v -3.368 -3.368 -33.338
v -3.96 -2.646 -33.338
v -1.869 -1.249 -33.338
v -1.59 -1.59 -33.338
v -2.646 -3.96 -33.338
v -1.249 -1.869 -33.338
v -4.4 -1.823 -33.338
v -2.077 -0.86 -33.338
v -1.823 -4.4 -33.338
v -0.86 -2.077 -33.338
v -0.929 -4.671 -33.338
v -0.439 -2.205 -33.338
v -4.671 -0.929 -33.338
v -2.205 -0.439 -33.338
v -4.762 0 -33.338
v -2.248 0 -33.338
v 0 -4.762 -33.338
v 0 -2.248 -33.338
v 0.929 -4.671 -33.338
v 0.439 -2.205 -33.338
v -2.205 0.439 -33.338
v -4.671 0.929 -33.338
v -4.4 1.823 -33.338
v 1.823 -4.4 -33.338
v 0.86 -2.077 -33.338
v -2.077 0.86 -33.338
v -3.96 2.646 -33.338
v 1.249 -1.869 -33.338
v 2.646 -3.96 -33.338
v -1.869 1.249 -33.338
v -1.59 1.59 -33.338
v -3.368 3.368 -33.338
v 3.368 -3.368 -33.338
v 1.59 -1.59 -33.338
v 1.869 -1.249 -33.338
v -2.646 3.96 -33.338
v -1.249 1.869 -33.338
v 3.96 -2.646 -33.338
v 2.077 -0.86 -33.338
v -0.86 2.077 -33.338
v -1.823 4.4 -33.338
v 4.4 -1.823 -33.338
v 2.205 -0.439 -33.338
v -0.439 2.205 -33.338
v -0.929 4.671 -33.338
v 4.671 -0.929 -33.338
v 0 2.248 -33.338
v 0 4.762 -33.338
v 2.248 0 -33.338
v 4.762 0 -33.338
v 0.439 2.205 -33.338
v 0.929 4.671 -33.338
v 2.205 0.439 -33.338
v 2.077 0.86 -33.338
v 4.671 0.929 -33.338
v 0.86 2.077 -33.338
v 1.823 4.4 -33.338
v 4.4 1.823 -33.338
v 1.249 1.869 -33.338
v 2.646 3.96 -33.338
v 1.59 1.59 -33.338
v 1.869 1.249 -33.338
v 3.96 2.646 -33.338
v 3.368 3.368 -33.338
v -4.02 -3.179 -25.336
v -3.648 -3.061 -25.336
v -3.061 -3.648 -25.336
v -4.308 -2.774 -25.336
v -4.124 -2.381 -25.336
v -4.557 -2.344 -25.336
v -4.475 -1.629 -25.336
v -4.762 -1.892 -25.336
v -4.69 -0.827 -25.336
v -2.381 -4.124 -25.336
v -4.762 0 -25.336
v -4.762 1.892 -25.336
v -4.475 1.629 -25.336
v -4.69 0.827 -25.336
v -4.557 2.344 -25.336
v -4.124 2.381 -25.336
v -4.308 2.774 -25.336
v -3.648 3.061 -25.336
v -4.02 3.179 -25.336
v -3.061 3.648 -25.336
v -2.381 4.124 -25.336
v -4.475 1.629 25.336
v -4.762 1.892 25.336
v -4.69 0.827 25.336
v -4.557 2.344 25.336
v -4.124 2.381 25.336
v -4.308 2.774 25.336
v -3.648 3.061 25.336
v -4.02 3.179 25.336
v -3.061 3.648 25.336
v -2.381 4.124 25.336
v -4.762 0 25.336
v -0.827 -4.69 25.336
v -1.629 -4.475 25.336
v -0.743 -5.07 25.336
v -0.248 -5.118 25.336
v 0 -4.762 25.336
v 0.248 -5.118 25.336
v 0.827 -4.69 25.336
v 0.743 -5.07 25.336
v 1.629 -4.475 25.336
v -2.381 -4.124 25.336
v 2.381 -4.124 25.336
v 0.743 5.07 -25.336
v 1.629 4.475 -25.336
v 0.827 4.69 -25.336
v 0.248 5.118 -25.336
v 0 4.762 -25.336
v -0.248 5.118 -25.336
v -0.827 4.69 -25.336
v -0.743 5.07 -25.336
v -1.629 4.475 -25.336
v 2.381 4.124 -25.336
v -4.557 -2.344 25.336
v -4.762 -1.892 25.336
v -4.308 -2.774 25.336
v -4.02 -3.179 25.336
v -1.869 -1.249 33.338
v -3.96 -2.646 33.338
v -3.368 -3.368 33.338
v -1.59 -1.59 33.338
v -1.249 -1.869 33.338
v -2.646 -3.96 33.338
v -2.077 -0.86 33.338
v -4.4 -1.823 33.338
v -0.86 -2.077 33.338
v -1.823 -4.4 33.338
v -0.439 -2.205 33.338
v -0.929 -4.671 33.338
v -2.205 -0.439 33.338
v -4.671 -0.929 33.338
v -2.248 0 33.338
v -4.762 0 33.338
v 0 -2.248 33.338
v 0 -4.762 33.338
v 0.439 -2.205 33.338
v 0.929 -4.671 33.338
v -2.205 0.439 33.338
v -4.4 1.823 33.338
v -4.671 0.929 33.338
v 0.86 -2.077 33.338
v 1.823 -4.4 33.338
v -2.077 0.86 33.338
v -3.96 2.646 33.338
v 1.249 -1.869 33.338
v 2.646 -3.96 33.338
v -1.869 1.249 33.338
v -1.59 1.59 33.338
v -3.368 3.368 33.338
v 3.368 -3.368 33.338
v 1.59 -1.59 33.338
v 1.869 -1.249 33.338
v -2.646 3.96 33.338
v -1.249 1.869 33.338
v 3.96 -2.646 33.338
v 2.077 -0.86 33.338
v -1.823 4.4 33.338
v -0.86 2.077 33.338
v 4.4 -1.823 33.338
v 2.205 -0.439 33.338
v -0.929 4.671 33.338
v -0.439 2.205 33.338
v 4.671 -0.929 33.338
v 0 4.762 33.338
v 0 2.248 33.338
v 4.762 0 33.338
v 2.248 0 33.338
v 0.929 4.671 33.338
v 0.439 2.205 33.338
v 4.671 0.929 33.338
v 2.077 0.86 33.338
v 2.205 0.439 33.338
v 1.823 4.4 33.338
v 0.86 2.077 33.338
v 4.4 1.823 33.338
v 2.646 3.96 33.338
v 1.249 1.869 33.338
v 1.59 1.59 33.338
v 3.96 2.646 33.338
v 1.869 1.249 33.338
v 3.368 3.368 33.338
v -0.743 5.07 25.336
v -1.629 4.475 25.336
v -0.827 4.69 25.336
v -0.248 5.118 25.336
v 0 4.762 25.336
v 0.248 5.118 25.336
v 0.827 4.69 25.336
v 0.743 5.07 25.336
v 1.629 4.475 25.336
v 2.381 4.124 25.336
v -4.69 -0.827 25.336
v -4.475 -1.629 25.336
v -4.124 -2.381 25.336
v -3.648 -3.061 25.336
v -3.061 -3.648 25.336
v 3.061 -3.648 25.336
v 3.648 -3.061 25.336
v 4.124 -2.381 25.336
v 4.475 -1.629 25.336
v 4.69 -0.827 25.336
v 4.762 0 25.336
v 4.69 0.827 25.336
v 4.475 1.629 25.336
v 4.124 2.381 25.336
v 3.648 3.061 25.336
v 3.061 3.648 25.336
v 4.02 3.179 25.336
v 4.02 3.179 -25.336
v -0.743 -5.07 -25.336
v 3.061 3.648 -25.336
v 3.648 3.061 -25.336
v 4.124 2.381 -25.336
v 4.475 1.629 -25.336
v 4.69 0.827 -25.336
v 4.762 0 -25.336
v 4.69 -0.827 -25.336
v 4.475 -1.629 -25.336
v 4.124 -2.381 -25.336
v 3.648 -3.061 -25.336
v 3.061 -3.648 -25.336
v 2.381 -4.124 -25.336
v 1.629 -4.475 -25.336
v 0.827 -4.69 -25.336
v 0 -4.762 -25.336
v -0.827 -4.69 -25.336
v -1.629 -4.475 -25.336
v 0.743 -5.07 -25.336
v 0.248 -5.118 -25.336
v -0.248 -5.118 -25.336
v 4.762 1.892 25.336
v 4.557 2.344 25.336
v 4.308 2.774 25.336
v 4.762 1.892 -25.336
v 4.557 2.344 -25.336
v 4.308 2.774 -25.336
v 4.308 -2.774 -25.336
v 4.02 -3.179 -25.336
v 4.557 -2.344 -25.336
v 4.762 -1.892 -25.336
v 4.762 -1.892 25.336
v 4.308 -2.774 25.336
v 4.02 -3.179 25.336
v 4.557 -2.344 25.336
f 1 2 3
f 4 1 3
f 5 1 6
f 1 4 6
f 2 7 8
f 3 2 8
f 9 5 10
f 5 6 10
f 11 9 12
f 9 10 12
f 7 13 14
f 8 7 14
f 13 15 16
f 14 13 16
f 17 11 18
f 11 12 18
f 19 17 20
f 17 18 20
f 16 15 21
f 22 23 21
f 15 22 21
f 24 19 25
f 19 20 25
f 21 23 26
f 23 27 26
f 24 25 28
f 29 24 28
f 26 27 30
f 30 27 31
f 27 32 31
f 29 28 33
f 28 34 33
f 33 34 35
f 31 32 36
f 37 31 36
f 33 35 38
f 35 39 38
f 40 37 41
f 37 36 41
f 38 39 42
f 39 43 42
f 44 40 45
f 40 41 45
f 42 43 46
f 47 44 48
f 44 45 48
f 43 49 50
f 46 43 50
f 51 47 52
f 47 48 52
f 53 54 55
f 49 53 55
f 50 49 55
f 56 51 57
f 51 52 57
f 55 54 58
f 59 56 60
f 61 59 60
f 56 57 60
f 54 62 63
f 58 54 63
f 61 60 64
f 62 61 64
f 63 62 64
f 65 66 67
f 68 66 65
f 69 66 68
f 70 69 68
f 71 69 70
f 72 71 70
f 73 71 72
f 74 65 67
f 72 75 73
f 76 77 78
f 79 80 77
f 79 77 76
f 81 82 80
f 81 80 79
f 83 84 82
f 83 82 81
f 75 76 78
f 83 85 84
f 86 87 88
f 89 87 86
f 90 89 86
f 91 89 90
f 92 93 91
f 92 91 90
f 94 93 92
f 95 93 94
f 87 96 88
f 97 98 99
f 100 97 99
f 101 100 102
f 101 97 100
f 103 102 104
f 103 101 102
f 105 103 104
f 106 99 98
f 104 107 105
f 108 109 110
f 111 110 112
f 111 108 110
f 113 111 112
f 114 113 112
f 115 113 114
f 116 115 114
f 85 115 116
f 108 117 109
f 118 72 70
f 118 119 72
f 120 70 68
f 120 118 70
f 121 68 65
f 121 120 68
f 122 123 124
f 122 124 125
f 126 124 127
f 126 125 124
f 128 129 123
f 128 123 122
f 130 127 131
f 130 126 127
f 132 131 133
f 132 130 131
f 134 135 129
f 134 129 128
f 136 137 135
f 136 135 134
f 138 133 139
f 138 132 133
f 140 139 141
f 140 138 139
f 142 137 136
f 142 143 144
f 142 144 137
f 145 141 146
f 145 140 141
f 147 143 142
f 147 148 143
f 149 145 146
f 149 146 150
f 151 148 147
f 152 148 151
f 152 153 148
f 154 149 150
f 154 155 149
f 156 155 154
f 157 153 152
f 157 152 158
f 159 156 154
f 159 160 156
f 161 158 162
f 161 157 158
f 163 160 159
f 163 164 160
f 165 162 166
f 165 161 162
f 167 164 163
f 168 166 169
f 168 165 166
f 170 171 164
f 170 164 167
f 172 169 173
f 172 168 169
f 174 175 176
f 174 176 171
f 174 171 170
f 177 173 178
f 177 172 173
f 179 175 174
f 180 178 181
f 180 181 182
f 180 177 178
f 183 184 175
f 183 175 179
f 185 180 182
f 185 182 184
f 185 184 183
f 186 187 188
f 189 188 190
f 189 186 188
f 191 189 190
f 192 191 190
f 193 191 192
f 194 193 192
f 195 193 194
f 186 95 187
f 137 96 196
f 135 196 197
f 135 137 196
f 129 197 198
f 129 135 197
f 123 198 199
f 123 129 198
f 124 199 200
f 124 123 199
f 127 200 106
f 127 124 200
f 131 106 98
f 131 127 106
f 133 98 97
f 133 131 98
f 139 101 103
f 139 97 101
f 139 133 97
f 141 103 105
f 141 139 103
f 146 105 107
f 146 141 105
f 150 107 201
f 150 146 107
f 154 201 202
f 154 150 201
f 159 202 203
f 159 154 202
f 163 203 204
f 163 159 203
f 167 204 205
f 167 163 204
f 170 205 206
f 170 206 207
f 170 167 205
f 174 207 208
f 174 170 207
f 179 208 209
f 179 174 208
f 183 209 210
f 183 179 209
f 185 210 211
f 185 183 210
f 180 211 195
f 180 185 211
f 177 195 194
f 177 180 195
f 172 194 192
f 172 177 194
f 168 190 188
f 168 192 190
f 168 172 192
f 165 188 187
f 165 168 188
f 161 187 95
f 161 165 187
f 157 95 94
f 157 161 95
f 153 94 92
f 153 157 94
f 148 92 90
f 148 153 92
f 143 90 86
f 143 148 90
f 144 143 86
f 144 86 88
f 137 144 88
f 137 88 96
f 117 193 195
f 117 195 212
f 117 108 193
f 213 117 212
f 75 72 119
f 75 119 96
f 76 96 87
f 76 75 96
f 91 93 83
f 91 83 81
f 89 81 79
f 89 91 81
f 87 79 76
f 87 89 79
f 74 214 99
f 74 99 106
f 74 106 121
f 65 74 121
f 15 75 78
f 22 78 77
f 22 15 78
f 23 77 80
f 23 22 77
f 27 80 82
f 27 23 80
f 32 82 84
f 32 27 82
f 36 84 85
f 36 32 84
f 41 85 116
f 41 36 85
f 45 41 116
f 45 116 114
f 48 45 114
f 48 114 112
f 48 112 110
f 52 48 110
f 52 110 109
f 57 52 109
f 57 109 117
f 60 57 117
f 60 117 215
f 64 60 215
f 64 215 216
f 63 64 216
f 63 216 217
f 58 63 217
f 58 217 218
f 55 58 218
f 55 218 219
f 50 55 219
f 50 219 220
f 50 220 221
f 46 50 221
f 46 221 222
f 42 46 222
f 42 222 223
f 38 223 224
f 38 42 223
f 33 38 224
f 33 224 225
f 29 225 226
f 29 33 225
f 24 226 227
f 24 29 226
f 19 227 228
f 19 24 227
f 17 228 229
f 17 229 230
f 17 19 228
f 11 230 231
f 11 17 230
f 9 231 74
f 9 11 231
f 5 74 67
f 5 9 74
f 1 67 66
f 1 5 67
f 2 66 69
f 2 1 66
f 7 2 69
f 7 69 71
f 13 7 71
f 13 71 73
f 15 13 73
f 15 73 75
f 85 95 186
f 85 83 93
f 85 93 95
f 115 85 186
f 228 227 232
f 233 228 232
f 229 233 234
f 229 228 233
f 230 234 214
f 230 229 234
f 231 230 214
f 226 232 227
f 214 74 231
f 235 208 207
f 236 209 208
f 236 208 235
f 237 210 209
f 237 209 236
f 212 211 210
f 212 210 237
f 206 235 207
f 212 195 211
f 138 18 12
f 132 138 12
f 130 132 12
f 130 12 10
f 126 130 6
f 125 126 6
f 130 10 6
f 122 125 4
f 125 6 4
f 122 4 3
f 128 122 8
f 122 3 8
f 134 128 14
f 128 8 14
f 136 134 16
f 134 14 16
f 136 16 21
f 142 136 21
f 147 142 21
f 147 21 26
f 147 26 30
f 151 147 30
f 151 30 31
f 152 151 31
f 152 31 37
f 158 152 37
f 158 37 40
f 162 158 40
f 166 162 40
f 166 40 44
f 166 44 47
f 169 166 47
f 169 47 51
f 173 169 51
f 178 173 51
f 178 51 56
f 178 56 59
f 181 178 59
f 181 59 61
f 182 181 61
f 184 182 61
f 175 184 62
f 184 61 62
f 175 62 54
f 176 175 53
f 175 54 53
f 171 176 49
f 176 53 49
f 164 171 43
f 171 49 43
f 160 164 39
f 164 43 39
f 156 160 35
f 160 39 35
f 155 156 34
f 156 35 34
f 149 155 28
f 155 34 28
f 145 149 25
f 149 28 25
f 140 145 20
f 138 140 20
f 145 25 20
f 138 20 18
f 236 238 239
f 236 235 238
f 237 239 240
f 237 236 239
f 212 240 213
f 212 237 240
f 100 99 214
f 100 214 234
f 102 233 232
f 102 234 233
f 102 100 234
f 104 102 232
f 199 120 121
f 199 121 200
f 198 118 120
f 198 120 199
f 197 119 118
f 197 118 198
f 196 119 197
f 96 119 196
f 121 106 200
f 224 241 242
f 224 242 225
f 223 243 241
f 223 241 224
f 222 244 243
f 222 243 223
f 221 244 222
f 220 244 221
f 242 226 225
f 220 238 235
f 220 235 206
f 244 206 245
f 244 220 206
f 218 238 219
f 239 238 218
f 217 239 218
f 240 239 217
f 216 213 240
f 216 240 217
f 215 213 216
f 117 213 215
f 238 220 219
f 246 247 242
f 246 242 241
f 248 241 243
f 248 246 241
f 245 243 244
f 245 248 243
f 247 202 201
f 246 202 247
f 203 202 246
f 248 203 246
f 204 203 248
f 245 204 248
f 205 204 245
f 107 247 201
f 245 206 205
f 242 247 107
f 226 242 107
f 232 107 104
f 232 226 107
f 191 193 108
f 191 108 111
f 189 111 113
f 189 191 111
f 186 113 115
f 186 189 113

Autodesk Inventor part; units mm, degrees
ref_plane "YZ Plane" through (0, 0, 0) normal (1, 0, 0) x (0, 1, 0)
ref_plane "XZ Plane" through (0, 0, 0) normal (0, 1, 0) x (-1, 0, 0)
ref_plane "XY Plane" through (0, 0, 0) normal (0, 0, 1) x (1, 0, 0)
sketch "Sketch1" plane through (0, 0, 0) normal (0, 0, 1) x (1, 0, 0)
  line L0 (-4.7625, -2.7496) -> (-4.7625, 2.7496)
  line L1 (-4.7625, 2.7496) -> (0, 5.4993)
  line L2 (0, 5.4993) -> (4.7625, 2.7496)
  line L3 (4.7625, 2.7496) -> (4.7625, -2.7496)
  line L4 (4.7625, -2.7496) -> (0, -5.4993)
  line L5 (0, -5.4993) -> (-4.7625, -2.7496)
  point P0 (0, 0)
  point P1 (0, 0)
  dimension "Size" = 9.525
extrude "Extrusion1" add sketch "Sketch1" along normal mid plane 66.675
sketch "Sketch3" plane through (0, 0, 33.3375) normal (0, 0, 1) x (1, 0, 0)
  line L0 (-4.7625, 2.7496) -> (0, 5.4993) construction
  line L1 (0, 5.4993) -> (4.7625, 2.7496) construction
  line L2 (4.7625, 2.7496) -> (4.7625, -2.7496) construction
  line L3 (4.7625, -2.7496) -> (0, -5.4993) construction
  line L4 (0, -5.4993) -> (-4.7625, -2.7496) construction
  line L5 (-4.7625, -2.7496) -> (-4.7625, 2.7496) construction
  point P0 (0, 0)
hole "Hole1" at (0, 0, 33.3375) direction (0, 0, -1) diameter 4.4958 end through all
sketch "Sketch4" plane through (0, 0, 33.3375) normal (0, 0, 1) x (1, 0, 0)
  circle A0 centre (0, 0) radius 2.2479 construction
  line L0 (-4.7625, 2.7496) -> (0, 5.4993) construction
  line L1 (0, 5.4993) -> (4.7625, 2.7496) construction
  line L2 (4.7625, 2.7496) -> (4.7625, -2.7496) construction
  line L3 (4.7625, -2.7496) -> (0, -5.4993) construction
  line L4 (0, -5.4993) -> (-4.7625, -2.7496) construction
  line L5 (-4.7625, -2.7496) -> (-4.7625, 2.7496) construction
  circle A1 centre (0, 0) radius 5.1245
  circle A2 centre (0, 0) radius 8.89
  dimension "thunder" = 10.2489
  dimension "d16" = 17.78
extrude "Extrusion3" cut sketch "Sketch4" against normal through all
sketch "Sketch5" plane through (0, 0, -33.3375) normal (0, 0, -1) x (-1, 0, 0)
  arc A0 (-4.7625, -1.8917) -> (-4.0195, -3.1786) centre (0, 0) ccw projected
  line L0 (-4.0195, -3.1786) -> (-0.743, -5.0703) projected
  arc A1 (-0.743, -5.0703) -> (0.743, -5.0703) centre (0, 0) ccw projected
  line L1 (0.743, -5.0703) -> (4.0195, -3.1786) projected
  arc A2 (4.0195, -3.1786) -> (4.7625, -1.8917) centre (0, 0) ccw projected
  line L2 (4.7625, -1.8917) -> (4.7625, 1.8917) projected
  arc A3 (4.7625, 1.8917) -> (4.0195, 3.1786) centre (0, 0) ccw projected
  line L3 (4.0195, 3.1786) -> (0.743, 5.0703) projected
  arc A4 (0.743, 5.0703) -> (-0.743, 5.0703) centre (0, 0) ccw projected
  line L4 (-0.743, 5.0703) -> (-4.0195, 3.1786) projected
  arc A5 (-4.0195, 3.1786) -> (-4.7625, 1.8917) centre (0, 0) ccw projected
  line L5 (-4.7625, 1.8917) -> (-4.7625, -1.8917) projected
  circle A6 centre (0, 0) radius 2.2479 projected
  circle A7 centre (0, 0) radius 2.2479 construction
  circle A8 centre (0, 0) radius 4.7625
  point P0 (-4.7625, 0)
  point P1 (-2.3813, 4.1244)
  point P2 (2.3813, 4.1244)
  point P3 (4.7625, 0)
  point P4 (2.3812, -4.1244)
  point P5 (-2.3812, -4.1244)
  dimension "d19" = 9.525
extrude "Extrusion4" cut sketch "Sketch5" against normal blind 8.001 contours L5 A8 L0 A0 | L5 A5 L4 A8 | A8 L1 A1 L0 | L4 A4 L3 A8 | A8 L2 A2 L1 | L3 A3 L2 A8
mirror "Mirror2" about plane through (0, 0, 0) normal (0, 0, 1) of "Extrusion4"
equation "\"bearing\" = 25.4"
properties part number "GP6-008" material "Aluminum 6061"
